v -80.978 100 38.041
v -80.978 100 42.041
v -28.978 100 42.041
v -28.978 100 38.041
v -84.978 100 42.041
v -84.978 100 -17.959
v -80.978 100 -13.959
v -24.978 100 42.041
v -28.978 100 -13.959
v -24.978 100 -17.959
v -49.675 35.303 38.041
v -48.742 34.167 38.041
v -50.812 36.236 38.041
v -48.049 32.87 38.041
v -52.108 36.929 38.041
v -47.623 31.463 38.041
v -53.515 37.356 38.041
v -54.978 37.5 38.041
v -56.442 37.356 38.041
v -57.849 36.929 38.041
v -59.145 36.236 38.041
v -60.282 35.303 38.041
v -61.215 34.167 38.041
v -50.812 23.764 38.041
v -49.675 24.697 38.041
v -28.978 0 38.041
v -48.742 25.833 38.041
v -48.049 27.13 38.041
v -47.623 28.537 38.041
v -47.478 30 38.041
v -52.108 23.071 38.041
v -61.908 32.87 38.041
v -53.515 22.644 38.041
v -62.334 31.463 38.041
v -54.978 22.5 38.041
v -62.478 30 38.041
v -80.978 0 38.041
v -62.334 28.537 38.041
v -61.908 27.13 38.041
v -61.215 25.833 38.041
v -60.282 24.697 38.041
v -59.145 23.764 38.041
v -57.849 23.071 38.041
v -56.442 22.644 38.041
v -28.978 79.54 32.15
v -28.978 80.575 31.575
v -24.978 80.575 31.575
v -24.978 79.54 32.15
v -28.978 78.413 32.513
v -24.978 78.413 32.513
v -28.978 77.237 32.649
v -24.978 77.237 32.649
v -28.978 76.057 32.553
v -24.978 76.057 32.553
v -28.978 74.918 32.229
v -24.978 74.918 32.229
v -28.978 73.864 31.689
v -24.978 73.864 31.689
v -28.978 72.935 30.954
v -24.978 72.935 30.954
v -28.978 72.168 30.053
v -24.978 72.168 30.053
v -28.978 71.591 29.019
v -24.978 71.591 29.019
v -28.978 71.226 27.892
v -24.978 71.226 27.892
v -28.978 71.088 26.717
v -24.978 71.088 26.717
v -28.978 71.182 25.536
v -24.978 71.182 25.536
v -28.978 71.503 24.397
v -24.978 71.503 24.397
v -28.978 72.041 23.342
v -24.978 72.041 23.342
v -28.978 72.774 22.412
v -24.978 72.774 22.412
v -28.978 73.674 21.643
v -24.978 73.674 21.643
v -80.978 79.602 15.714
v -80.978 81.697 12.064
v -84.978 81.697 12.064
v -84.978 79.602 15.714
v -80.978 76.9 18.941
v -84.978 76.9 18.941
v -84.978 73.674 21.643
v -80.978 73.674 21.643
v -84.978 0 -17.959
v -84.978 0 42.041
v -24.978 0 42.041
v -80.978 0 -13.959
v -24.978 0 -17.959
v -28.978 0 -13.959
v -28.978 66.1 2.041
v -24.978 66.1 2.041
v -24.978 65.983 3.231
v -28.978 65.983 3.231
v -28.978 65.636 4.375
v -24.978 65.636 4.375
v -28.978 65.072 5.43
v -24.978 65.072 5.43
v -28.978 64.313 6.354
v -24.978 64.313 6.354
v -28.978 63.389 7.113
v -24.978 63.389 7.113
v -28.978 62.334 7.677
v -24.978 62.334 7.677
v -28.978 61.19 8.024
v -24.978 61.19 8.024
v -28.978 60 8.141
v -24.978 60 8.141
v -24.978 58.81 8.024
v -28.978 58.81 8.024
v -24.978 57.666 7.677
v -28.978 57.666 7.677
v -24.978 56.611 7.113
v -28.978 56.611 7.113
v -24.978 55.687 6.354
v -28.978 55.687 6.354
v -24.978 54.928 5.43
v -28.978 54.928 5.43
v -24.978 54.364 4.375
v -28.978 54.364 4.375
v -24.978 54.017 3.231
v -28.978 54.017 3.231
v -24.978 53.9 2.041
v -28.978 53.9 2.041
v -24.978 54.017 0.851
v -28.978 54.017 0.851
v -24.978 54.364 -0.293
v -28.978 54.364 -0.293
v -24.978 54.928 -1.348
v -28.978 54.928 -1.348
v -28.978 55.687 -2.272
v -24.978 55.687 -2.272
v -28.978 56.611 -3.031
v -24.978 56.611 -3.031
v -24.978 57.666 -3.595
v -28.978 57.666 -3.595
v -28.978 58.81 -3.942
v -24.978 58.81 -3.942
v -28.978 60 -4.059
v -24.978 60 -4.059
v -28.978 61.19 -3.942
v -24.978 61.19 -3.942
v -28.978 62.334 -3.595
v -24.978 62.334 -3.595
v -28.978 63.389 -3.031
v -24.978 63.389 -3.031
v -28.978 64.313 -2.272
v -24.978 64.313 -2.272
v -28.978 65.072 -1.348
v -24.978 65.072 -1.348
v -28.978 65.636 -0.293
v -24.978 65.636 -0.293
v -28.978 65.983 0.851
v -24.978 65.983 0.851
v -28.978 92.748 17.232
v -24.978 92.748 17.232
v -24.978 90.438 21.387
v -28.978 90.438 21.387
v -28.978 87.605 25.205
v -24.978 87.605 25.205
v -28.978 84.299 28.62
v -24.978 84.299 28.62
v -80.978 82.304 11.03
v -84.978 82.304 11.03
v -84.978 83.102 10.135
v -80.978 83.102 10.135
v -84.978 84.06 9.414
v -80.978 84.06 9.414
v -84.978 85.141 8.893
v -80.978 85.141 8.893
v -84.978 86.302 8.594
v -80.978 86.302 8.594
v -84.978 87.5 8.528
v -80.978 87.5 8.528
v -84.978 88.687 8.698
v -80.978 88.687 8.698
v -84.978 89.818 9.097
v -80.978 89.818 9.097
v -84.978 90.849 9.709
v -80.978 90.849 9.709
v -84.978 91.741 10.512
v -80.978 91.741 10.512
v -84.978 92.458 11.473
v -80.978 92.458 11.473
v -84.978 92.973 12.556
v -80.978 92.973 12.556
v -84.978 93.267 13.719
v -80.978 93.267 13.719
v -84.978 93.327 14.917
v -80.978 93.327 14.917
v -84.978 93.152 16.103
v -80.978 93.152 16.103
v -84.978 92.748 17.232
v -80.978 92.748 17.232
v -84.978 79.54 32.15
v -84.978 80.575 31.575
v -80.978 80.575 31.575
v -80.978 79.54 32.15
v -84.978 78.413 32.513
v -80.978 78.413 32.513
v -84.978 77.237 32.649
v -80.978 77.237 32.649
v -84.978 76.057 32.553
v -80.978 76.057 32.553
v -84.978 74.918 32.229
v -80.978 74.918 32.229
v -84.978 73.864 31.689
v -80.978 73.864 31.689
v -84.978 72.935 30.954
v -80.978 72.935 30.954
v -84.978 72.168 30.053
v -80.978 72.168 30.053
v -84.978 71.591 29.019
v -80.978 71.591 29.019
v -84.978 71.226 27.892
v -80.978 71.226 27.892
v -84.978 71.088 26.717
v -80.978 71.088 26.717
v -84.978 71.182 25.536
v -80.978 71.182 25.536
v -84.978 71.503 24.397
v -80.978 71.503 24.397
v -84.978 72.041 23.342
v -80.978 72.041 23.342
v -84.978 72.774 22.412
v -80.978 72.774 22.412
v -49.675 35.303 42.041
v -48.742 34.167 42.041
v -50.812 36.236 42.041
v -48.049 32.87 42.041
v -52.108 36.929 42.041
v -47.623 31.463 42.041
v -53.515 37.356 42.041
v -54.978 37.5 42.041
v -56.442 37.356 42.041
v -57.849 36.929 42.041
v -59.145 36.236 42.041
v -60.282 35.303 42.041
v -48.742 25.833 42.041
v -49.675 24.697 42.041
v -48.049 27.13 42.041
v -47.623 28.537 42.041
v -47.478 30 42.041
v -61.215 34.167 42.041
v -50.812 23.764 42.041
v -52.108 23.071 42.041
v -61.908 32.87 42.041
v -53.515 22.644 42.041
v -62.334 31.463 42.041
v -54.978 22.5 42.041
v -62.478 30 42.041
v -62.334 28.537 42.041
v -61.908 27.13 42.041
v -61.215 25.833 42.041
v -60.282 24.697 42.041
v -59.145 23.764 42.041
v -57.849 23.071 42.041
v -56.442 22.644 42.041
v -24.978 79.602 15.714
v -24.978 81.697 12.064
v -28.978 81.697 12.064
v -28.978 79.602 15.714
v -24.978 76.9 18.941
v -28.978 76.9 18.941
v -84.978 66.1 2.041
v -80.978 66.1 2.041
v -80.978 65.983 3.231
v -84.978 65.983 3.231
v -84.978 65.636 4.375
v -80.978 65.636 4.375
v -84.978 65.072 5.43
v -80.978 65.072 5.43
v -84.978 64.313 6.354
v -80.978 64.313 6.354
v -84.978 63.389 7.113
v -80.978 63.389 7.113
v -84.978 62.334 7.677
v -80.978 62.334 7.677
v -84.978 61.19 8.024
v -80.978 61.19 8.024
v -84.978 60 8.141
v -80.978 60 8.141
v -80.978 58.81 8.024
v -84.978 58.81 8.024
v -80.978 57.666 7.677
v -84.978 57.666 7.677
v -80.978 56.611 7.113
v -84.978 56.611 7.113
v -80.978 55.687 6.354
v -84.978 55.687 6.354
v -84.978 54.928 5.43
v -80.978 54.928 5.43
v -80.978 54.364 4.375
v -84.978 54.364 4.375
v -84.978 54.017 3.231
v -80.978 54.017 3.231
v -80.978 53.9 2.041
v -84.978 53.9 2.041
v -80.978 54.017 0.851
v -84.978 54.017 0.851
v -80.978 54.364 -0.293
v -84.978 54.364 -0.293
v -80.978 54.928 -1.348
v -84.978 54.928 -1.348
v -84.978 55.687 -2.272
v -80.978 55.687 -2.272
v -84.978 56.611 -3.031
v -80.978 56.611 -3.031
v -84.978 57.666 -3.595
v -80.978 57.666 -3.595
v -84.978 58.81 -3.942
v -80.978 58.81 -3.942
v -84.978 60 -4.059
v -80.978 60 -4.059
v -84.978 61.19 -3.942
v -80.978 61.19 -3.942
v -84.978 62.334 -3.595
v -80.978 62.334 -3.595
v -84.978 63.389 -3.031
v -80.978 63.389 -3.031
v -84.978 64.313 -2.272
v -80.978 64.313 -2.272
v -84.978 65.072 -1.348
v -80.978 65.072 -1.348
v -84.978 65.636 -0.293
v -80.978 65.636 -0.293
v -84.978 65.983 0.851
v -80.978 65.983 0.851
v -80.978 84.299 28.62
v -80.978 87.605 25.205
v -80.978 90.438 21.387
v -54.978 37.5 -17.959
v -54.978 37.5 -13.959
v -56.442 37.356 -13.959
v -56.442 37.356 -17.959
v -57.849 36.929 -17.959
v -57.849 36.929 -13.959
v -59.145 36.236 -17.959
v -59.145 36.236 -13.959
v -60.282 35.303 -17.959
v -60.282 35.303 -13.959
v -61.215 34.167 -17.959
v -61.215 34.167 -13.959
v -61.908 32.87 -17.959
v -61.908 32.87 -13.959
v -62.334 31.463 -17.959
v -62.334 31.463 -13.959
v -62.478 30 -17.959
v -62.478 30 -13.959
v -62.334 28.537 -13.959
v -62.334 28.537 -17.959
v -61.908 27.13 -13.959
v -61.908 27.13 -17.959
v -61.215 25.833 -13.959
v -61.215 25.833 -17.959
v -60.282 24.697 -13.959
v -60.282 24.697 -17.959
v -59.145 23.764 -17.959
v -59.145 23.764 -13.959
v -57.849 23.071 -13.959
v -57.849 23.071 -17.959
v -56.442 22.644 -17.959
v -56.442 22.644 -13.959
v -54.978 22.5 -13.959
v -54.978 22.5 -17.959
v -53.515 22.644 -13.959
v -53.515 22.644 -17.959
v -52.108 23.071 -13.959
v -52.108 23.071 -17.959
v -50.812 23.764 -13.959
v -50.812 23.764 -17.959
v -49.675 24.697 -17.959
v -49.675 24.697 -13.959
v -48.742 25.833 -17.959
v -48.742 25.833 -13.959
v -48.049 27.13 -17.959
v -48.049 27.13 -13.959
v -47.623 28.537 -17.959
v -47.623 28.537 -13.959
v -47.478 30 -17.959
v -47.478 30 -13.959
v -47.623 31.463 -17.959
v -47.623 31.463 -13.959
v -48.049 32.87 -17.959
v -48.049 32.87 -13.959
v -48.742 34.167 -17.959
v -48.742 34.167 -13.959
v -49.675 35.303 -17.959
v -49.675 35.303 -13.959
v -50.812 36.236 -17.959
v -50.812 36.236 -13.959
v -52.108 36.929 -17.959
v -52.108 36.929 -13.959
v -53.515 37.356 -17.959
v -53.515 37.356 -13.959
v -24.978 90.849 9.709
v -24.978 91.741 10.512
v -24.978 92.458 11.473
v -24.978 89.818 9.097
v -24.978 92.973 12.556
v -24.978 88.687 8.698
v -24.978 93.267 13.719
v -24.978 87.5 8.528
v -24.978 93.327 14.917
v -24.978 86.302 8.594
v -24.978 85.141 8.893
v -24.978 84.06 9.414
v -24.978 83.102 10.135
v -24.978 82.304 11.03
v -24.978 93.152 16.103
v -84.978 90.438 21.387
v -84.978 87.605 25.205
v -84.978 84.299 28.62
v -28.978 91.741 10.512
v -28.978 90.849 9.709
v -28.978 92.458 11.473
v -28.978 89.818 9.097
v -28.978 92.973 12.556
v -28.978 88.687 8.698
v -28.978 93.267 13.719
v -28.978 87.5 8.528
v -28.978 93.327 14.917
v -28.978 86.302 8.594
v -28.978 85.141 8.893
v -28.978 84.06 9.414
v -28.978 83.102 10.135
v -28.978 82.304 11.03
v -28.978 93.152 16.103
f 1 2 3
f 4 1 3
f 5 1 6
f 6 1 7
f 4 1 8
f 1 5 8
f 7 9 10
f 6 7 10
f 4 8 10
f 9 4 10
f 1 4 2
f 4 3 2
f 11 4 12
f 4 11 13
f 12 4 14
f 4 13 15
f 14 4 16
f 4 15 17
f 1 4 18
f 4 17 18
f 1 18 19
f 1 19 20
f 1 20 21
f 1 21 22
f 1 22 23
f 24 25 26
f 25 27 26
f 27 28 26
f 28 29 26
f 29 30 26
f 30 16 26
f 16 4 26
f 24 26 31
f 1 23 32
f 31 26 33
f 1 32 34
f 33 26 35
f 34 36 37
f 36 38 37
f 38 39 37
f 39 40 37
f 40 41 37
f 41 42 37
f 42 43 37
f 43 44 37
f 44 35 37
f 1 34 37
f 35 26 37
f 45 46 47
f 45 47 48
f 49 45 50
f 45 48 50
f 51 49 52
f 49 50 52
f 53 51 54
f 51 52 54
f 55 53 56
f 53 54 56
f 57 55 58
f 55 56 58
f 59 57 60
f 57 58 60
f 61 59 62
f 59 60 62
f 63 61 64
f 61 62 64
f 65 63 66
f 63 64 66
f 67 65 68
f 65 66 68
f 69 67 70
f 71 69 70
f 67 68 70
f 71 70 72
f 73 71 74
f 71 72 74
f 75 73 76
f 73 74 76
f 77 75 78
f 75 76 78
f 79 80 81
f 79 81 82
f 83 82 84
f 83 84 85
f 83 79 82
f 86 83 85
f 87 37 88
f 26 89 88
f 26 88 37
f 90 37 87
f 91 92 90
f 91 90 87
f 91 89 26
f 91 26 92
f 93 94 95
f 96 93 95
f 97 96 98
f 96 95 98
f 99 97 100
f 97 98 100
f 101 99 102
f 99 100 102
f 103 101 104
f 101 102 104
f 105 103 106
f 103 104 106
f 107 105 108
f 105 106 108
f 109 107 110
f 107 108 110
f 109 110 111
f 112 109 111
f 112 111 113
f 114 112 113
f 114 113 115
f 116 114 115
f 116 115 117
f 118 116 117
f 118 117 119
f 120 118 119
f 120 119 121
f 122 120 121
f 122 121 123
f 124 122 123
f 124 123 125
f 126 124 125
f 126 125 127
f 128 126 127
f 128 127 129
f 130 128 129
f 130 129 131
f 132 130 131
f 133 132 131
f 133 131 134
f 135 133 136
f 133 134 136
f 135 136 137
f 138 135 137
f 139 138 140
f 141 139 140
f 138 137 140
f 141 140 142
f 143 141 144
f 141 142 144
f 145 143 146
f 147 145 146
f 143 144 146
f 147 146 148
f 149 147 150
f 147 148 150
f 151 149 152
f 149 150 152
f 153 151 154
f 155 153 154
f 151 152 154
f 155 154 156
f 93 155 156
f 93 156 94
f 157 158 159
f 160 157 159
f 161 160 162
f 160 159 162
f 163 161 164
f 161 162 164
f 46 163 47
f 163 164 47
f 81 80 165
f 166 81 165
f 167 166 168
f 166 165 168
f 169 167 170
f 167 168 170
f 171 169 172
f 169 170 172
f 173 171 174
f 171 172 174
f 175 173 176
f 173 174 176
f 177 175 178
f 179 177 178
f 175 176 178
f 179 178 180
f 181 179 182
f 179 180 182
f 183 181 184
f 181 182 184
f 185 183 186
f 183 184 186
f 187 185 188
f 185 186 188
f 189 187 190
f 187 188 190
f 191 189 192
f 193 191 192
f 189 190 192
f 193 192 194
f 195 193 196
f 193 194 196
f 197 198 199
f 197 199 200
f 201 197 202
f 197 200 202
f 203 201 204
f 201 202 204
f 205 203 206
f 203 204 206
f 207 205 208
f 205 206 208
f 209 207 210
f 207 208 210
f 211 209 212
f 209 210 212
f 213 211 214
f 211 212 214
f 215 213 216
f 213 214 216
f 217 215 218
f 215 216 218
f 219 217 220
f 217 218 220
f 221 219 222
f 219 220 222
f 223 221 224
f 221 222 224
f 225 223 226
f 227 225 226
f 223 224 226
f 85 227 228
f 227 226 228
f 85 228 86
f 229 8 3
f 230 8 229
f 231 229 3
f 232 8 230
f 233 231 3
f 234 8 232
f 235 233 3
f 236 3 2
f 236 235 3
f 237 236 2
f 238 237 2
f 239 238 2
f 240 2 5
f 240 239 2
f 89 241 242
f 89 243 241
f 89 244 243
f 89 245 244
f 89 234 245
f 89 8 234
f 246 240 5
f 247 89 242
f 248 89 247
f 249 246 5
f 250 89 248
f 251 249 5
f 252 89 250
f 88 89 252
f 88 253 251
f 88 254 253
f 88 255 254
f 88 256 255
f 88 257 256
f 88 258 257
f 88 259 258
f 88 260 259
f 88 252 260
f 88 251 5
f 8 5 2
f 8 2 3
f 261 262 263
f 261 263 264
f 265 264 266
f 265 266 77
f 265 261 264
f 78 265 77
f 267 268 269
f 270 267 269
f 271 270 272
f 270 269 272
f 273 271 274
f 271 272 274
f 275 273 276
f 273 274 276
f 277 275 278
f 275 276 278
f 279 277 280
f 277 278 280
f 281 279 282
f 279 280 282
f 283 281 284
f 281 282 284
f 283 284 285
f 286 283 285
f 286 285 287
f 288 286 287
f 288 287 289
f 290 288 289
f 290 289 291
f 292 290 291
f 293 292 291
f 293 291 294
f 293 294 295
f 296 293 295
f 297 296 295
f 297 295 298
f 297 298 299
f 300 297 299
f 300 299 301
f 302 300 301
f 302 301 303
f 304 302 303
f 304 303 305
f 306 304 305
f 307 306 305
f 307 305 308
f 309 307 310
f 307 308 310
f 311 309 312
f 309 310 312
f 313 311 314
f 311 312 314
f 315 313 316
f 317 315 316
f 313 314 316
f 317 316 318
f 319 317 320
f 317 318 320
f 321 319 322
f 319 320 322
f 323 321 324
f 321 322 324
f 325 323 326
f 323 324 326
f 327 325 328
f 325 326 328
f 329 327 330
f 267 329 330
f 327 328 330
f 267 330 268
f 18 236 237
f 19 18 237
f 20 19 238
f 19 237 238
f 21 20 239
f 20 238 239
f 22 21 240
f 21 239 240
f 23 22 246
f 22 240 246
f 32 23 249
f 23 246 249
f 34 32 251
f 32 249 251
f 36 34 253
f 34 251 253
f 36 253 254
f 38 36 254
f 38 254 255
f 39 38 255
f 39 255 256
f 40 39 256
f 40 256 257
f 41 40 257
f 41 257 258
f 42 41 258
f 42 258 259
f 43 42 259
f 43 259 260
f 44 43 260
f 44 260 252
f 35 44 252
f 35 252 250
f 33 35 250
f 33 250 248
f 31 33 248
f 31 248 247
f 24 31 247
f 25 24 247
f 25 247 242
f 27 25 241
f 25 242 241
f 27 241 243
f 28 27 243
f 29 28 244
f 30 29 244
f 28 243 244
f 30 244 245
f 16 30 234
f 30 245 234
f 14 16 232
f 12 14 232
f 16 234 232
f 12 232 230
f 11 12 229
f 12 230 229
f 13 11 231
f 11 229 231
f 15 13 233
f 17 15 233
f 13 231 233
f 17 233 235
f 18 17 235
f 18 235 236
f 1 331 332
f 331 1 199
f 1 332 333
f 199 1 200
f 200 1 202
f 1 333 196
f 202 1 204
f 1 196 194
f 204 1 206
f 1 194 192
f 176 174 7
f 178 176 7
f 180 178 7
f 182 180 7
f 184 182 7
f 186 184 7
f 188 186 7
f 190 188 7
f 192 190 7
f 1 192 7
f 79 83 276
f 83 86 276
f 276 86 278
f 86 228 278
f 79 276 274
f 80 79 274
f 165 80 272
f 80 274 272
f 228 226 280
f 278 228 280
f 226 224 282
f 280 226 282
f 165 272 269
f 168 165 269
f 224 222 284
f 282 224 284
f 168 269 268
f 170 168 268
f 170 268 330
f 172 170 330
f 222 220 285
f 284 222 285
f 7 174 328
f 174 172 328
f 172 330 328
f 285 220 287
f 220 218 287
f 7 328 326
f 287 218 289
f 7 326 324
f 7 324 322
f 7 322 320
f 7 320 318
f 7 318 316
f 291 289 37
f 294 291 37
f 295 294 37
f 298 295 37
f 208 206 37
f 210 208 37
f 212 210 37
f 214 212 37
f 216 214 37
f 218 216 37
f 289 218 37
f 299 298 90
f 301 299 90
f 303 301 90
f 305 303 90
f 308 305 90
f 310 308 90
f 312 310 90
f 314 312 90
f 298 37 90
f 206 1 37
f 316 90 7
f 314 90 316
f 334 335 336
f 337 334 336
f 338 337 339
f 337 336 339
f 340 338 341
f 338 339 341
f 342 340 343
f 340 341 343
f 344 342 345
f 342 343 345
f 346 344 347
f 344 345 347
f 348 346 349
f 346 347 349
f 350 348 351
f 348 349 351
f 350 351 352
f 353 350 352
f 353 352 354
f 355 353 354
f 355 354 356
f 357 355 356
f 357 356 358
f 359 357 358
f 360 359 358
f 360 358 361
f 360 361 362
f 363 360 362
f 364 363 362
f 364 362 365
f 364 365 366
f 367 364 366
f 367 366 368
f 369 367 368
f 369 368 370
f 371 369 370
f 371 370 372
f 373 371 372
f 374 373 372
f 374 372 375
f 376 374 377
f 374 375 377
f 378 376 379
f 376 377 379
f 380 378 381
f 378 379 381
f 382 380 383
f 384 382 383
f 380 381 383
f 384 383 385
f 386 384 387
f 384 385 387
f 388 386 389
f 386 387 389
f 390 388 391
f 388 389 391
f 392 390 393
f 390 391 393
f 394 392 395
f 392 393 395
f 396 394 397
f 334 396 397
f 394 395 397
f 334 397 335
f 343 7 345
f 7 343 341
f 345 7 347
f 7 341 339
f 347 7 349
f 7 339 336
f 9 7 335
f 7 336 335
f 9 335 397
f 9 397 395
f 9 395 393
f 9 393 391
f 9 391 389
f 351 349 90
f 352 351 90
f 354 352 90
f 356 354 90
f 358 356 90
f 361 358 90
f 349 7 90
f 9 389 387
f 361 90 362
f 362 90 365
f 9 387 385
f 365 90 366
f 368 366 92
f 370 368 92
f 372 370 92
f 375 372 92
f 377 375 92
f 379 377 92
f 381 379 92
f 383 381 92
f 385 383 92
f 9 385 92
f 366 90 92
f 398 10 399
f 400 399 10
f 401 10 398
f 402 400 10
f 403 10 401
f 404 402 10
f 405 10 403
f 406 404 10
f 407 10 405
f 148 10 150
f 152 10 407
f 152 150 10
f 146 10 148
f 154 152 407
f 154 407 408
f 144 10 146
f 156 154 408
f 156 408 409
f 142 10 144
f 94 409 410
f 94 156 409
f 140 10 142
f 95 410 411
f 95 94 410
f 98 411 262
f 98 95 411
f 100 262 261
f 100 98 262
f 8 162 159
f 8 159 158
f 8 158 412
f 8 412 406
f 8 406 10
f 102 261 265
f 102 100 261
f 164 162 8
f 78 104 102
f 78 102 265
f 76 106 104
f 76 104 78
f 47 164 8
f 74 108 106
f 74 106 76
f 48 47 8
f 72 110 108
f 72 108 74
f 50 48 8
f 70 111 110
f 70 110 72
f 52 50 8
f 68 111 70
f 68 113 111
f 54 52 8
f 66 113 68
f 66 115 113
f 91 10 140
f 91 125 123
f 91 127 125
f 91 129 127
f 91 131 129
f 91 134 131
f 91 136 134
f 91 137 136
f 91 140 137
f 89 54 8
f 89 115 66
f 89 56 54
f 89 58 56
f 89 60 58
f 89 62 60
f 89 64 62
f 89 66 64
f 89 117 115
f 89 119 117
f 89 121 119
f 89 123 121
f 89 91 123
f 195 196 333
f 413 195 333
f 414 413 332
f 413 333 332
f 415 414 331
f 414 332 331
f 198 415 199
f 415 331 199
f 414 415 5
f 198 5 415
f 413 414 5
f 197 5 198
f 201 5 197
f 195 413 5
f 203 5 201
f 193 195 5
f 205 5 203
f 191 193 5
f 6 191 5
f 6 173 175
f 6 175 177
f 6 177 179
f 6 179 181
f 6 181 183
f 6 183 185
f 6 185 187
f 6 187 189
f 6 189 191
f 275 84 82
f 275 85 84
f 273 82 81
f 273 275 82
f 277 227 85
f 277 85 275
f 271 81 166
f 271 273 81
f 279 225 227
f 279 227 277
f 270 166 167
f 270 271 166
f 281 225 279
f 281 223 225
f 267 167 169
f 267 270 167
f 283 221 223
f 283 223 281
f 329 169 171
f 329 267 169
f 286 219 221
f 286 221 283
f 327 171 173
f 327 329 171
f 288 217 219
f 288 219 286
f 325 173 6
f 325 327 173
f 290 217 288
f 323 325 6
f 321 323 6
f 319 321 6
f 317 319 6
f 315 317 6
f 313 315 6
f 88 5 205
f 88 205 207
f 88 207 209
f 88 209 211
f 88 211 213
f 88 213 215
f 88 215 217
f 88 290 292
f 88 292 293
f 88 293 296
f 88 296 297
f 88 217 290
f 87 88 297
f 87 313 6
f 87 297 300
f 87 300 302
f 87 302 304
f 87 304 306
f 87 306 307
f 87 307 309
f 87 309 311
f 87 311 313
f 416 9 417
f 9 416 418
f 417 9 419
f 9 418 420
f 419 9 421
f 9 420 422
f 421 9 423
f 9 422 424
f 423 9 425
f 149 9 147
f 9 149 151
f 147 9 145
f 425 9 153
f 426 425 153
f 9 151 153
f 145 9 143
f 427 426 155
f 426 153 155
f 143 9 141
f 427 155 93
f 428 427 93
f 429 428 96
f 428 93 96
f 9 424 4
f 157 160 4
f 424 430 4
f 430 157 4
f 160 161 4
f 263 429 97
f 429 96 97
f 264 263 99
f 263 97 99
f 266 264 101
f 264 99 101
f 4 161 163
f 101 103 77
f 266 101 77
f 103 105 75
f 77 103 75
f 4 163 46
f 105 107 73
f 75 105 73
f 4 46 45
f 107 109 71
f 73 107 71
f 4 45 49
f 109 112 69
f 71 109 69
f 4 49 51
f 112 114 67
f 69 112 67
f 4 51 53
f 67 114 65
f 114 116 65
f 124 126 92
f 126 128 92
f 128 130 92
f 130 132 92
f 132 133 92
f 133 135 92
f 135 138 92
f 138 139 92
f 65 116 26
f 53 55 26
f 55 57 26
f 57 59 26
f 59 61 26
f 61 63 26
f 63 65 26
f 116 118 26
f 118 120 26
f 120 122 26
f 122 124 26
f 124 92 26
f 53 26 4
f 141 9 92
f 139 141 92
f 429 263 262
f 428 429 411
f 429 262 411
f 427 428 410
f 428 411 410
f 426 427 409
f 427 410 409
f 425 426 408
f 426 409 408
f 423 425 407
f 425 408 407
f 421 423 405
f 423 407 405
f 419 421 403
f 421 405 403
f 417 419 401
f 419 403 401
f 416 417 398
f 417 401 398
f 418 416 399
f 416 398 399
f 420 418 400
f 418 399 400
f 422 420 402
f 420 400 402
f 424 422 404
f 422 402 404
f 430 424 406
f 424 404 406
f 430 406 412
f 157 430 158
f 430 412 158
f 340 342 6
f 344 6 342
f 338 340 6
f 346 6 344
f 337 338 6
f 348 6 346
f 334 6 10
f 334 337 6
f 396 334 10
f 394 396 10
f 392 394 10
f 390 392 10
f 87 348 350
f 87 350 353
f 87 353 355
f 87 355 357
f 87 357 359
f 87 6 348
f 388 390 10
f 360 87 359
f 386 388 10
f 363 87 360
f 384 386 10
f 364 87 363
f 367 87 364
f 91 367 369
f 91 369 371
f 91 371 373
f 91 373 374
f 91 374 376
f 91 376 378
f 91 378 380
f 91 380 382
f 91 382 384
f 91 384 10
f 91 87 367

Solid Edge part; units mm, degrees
sketch "Sketch1" plane through (0, 0, 0) normal (0, -1, 0) x (1, 0, 0)
  line L0 (-80.9785, -13.9589) -> (-28.9785, -13.9589)
  line L1 (-28.9785, -13.9589) -> (-28.9785, 38.0411)
  line L2 (-28.9785, 38.0411) -> (-80.9785, 38.0411)
  line L3 (-80.9785, 38.0411) -> (-80.9785, -13.9589)
  line L4 (-84.9785, -17.9589) -> (-24.9785, -17.9589)
  line L5 (-24.9785, -17.9589) -> (-24.9785, 42.0411)
  line L6 (-24.9785, 42.0411) -> (-84.9785, 42.0411)
  line L7 (-84.9785, 42.0411) -> (-84.9785, -17.9589)
  dimension "D1" = 60
  dimension "D2" = 4
  dimension "D3" = 4
  dimension "D4" = 60
extrude "Protrusion1" add sketch "Sketch1" against normal blind 100
sketch "Sketch2" plane through (-49.9785, 50, 42.0411) normal (0, 0, 1) x (1, 0, 0)
  line L0 (21, 49.9999) -> (-31, 49.9999)
  line L1 (-31, 49.9999) -> (-31, 50) construction
  line L2 (-31, 50) -> (21, 50)
  line L3 (21, 50) -> (21, 49.9999) construction
  dimension "D1" = 0.0001
  dimension "D2" = 52
extrude "Cutout1" cut sketch "Sketch2" against normal blind 5
sketch "Sketch3" plane through (-24.9785, 50, 17.0411) normal (1, 0, 0) x (0, 1, 0)
  arc A0 (23.6741, 4.6017) -> (31.6966, -4.9767) centre (10, -15) cw
  arc A1 (42.748, 0.1912) -> (31.6966, -4.9767) centre (37.2343, -2.4184) cw
  arc A2 (30.5748, 14.5338) -> (42.748, 0.1912) centre (9.8876, -15.3615) cw
  arc A3 (30.5748, 14.5338) -> (23.6741, 4.6017) centre (27.1339, 9.5613) ccw
  circle A4 centre (10, -15) radius 6.1
  dimension "D1" = 12.2
  dimension "D2" = 20
  dimension "D3" = 40
  dimension "D4" = 12.2
  dimension "D5" = 23.9
extrude "Cutout2" cut sketch "Sketch3" against normal through all
sketch "Sketch4" plane through (-49.9785, 75, 42.0411) normal (0, 0, 1) x (0, 1, 0)
  circle A0 centre (-45, 5) radius 7.5
  dimension "D1" = 30
extrude "Cutout3" cut sketch "Sketch4" against normal through all
